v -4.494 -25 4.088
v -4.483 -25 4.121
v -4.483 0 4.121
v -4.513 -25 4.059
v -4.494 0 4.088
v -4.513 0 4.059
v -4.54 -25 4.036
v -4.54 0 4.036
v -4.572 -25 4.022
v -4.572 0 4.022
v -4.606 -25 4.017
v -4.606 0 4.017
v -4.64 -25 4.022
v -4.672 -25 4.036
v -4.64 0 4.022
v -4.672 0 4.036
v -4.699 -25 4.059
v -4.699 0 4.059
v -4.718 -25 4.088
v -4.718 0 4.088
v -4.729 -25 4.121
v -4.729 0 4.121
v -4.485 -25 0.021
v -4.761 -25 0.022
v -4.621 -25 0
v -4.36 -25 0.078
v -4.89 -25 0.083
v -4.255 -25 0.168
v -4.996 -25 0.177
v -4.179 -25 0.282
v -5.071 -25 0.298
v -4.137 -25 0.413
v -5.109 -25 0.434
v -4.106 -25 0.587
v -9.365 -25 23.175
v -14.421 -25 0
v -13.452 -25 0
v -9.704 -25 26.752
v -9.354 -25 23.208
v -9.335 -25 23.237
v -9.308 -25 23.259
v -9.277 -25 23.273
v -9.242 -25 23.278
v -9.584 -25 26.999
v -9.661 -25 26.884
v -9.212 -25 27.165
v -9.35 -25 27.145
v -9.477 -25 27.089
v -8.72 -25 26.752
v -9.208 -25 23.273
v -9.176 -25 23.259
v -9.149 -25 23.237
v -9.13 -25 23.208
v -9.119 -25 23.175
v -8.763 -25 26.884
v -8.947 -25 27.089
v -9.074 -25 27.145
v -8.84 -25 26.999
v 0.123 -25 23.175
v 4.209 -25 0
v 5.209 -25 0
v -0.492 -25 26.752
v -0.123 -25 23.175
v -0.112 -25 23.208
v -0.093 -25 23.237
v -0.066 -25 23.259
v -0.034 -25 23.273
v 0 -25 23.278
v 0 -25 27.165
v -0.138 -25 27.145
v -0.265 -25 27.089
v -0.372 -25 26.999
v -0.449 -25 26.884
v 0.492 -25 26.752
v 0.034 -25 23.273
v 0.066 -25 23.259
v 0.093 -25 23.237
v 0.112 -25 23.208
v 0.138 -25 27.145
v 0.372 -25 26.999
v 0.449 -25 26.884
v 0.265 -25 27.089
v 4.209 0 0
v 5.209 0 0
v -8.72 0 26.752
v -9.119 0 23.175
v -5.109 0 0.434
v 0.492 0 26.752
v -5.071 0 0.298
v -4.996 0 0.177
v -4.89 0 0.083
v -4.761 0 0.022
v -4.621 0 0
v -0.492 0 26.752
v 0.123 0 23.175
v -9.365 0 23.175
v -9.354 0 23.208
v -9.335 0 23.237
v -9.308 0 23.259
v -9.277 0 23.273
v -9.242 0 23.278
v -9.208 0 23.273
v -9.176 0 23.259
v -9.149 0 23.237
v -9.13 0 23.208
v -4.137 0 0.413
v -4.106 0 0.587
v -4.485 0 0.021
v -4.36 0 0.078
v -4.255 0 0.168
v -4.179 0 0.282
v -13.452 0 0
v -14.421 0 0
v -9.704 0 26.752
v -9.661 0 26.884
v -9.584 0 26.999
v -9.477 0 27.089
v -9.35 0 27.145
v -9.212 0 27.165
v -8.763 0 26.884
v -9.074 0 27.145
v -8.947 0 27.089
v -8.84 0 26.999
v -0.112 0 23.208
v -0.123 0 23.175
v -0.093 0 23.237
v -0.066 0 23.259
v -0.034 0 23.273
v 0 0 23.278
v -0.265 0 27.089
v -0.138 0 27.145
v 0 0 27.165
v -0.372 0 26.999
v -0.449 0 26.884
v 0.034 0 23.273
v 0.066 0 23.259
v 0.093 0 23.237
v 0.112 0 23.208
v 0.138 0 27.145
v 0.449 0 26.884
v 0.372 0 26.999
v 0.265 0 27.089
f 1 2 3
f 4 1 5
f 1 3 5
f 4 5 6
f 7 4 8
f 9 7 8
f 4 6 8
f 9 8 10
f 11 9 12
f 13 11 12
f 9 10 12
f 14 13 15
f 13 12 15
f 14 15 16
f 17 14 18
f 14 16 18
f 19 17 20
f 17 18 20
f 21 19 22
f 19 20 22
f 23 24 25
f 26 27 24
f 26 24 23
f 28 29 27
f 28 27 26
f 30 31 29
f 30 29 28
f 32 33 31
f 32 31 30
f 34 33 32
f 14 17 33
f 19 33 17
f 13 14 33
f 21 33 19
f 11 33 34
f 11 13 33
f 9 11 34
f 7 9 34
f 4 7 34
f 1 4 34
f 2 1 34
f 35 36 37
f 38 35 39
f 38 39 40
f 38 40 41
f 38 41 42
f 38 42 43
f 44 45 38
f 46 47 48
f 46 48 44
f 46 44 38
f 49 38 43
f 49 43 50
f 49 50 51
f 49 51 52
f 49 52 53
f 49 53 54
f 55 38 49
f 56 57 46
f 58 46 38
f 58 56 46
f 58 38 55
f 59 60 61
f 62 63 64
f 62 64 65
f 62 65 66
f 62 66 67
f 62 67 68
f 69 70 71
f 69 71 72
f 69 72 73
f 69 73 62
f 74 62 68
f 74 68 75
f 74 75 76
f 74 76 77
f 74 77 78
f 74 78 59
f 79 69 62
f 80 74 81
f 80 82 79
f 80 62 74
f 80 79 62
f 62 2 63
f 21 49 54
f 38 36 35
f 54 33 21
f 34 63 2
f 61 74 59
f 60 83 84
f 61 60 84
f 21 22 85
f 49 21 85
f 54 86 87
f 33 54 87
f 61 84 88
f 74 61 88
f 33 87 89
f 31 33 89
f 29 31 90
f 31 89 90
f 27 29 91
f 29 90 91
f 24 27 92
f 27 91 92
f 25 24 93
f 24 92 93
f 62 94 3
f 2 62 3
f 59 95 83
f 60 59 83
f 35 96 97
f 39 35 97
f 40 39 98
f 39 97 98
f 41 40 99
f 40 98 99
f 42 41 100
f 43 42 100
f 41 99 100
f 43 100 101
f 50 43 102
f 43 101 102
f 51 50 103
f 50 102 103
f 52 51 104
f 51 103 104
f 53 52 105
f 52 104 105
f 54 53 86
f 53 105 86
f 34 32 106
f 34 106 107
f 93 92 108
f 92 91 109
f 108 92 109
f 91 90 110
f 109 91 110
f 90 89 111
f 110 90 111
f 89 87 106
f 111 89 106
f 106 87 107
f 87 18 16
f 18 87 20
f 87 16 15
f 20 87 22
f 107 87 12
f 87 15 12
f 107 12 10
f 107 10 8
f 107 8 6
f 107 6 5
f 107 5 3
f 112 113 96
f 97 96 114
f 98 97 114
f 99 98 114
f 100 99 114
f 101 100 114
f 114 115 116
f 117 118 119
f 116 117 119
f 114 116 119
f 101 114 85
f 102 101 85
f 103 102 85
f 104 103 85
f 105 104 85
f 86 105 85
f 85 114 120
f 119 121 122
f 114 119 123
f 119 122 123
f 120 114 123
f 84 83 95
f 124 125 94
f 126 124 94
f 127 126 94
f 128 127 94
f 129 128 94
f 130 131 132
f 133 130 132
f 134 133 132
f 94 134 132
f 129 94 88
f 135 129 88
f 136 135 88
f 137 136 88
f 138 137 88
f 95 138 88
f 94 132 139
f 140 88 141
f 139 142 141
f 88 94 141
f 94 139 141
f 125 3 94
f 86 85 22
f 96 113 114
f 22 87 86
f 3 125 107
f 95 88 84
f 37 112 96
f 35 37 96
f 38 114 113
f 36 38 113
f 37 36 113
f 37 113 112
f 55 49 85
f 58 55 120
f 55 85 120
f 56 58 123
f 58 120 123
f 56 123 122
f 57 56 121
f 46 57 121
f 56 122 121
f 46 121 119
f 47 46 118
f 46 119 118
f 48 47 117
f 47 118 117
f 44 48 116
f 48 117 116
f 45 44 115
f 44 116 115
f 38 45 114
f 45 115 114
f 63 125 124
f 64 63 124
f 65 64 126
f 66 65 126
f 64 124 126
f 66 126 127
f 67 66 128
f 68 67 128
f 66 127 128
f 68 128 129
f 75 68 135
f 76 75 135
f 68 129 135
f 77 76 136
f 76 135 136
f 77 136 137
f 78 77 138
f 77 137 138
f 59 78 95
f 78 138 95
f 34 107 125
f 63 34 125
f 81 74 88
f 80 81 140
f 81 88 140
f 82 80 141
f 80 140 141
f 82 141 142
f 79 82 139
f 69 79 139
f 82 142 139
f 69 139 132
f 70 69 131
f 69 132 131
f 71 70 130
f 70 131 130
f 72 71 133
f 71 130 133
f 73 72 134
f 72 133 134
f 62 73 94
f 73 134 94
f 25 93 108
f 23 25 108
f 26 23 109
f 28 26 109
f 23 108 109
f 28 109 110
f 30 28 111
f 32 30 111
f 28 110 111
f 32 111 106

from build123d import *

# Parameters (mm, degrees)
F1_DEPTH = 25


with BuildPart() as f1:
    # F0 (on Front) → F1 (new body)
    with BuildSketch(Plane.XZ):
        with BuildLine():
            ThreePointArc((0.492404, 26.751671), (0, 27.164847), (-0.492404, 26.751671))
            Line((-0.492404, 26.751671), (-4.482871, 4.120605))
            ThreePointArc((-4.482871, 4.120605), (-4.605972, 4.017311), (-4.729073, 4.120605))
            Line((-4.729073, 4.120605), (-8.719541, 26.751671))
            ThreePointArc((-8.719541, 26.751671), (-9.211945, 27.164847), (-9.704349, 26.751671))
            Line((-9.704349, 26.751671), (-14.42139, 0))
            Line((-14.42139, 0), (-13.451544, 0))
            Line((-13.451544, 0), (-9.365199, 23.17481))
            ThreePointArc((-9.365199, 23.17481), (-9.242099, 23.278104), (-9.118998, 23.17481))
            Line((-9.118998, 23.17481), (-5.109237, 0.434329))
            ThreePointArc((-5.109237, 0.434329), (-4.945978, 0.126497), (-4.621282, 5.9e-05))
            ThreePointArc((-4.621282, 5.9e-05), (-4.304656, 0.119468), (-4.136591, 0.413176))
            Line((-4.136591, 0.413176), (-4.105972, 0.586824))
            Line((-4.105972, 0.586824), (-0.123101, 23.17481))
            ThreePointArc((-0.123101, 23.17481), (0, 23.278104), (0.123101, 23.17481))
            Line((0.123101, 23.17481), (4.209445, 0))
            Line((4.209445, 0), (5.209445, 0))
            Line((5.209445, 0), (0.492404, 26.751671))
        make_face()
    extrude(amount=F1_DEPTH)


solid = f1.part
